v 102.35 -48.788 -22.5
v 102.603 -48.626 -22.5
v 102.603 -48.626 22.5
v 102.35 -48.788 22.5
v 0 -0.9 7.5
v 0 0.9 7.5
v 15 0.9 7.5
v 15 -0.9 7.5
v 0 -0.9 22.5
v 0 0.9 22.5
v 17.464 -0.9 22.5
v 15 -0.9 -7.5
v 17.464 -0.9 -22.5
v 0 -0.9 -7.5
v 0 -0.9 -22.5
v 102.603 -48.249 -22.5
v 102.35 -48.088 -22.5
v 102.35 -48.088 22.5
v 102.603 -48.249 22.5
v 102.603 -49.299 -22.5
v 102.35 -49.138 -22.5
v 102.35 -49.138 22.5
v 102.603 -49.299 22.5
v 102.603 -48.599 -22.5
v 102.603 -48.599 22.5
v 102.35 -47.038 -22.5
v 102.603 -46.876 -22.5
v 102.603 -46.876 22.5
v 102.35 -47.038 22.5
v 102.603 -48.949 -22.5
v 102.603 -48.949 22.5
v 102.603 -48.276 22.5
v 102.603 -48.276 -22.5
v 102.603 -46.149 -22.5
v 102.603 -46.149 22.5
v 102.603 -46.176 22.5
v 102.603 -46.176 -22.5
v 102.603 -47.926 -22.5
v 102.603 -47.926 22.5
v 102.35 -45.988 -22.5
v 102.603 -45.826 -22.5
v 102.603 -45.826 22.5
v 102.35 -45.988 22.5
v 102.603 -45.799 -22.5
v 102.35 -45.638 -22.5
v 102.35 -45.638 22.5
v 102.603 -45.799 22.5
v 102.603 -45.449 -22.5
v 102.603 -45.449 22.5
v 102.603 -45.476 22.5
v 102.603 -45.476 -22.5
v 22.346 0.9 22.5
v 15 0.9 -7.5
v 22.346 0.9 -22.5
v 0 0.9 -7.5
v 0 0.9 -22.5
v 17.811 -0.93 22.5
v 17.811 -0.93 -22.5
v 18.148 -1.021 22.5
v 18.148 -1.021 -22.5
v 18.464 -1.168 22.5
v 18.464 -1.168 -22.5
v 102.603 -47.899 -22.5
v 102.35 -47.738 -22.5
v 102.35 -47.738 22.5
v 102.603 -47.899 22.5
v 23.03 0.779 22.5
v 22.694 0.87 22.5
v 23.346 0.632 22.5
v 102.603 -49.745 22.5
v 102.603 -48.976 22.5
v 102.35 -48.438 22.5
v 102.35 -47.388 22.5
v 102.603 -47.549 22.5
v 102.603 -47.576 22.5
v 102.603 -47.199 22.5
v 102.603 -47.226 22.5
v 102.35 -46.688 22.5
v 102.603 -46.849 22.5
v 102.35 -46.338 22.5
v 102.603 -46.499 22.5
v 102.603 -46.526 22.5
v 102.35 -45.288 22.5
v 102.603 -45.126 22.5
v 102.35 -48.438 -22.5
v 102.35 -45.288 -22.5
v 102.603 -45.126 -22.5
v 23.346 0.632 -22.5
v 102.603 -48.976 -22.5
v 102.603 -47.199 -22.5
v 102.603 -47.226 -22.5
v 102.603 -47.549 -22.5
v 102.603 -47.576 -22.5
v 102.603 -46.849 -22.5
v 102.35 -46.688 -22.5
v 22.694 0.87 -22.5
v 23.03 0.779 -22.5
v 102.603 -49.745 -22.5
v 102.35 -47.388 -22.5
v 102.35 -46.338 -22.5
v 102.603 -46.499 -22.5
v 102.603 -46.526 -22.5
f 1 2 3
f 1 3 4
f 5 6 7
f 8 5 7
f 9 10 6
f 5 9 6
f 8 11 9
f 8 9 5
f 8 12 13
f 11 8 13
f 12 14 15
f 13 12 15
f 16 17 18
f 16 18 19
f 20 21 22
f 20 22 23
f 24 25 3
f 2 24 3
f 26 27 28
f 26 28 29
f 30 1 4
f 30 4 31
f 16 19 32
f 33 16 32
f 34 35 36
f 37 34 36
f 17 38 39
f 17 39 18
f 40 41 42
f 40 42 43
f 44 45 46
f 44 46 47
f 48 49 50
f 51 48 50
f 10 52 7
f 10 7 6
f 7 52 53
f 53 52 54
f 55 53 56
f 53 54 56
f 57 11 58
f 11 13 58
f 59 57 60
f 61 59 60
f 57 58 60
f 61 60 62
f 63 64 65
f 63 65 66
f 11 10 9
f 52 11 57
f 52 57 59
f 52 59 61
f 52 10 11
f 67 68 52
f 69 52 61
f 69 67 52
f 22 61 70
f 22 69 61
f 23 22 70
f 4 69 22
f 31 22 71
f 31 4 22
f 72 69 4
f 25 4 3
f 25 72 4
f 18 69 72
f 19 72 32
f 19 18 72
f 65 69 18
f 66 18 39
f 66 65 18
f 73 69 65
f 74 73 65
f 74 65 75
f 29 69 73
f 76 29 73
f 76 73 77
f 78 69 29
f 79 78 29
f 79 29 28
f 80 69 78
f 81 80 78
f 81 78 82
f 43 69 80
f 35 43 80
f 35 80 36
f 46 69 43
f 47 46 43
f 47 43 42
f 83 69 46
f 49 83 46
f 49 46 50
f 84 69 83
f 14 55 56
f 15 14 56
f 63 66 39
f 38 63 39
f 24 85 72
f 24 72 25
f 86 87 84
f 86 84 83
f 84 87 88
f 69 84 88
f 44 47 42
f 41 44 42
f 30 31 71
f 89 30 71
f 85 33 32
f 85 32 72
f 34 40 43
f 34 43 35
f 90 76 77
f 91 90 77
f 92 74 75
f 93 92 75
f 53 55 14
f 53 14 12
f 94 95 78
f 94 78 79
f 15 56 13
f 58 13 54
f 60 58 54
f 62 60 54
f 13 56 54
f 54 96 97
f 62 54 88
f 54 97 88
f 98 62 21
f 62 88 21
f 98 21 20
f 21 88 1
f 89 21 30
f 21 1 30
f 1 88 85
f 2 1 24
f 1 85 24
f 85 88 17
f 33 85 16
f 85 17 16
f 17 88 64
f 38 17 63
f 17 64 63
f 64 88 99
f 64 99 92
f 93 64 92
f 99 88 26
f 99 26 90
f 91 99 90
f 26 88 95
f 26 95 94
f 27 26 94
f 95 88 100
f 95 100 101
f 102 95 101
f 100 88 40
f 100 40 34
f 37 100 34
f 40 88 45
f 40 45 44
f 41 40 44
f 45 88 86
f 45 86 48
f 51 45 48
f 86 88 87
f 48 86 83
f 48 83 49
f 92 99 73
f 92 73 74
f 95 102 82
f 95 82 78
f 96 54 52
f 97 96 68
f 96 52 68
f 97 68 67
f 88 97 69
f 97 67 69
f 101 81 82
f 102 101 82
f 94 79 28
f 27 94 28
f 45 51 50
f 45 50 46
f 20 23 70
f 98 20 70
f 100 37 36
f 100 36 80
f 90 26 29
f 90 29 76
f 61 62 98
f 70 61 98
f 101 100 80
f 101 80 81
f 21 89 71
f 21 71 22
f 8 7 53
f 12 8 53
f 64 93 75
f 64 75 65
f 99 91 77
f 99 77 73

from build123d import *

# Parameters (mm, degrees)
SKETCH_1_W          = 45
SKETCH_1_H          = 1.8
EXTRUDE_1_DEPTH     = 18
SKETCH_2_W          = 15
SKETCH_2_H          = 15
CUT_EXTRUDE_1_DEPTH = 15
EXTRUDE_2_DEPTH     = 45
CUT_EXTRUDE_2_DEPTH = 45
CUT_EXTRUDE_3_DEPTH = 45
FILLET_1_R          = 2
FILLET_2_R          = 2


with BuildPart() as part:
    # 草图1 → 凸台-拉伸1 (new body)
    with BuildSketch(Plane(origin=(0, 0, 0), x_dir=(0, 0, -1), z_dir=(1, 0, 0))):
        Rectangle(SKETCH_1_W, SKETCH_1_H)
    extrude(amount=EXTRUDE_1_DEPTH)

    # 草图2 → 切除-拉伸1 (cut)
    with BuildSketch(Plane(origin=(0, 0.9, 0), x_dir=(1, 0, 0), z_dir=(0, 1, 0))):
        with Locations((7.5, 0)):
            Rectangle(SKETCH_2_W, SKETCH_2_H)
    extrude(amount=-CUT_EXTRUDE_1_DEPTH, mode=Mode.SUBTRACT)

    # 草图4 → 凸台-拉伸2 (add)
    with BuildSketch(Plane(origin=(0, 0, -22.5), x_dir=(-1, 0, 0), z_dir=(0, 0, -1))):
        Polygon((-18, -0.9), (-102.602540378, -49.745299462), (-104.602540378, -46.281197846), (-22.882308546, 0.9), (-18, 0.9), align=None)
    extrude(amount=-EXTRUDE_2_DEPTH)

    # 草图5 → 切除-拉伸2 (cut)
    with BuildSketch(Plane.XY.offset(22.5)):
        Polygon((102.602540378, -45.126497308), (102.602540378, -49.745299462), (104.602540378, -46.281197846), align=None)
    extrude(amount=-CUT_EXTRUDE_2_DEPTH, mode=Mode.SUBTRACT)

    # 草图6 → 切除-拉伸3 (cut)
    with BuildSketch(Plane.XY.offset(22.5)):
        Polygon((102.602540378, -45.126497308), (102.349506488, -45.287661356), (102.602540378, -45.448825404), align=None)
        Polygon((102.602540378, -45.476497308), (102.349506488, -45.637661356), (102.602540378, -45.798825404), align=None)
        Polygon((102.602540378, -45.826497308), (102.349506488, -45.987661356), (102.602540378, -46.148825404), align=None)
        Polygon((102.602540378, -46.176497308), (102.349506488, -46.337661356), (102.602540378, -46.498825404), align=None)
        Polygon((102.602540378, -46.526497308), (102.349506488, -46.687661356), (102.602540378, -46.848825404), align=None)
        Polygon((102.602540378, -46.876497308), (102.349506488, -47.037661356), (102.602540378, -47.198825404), align=None)
        Polygon((102.602540378, -47.226497308), (102.349506488, -47.387661356), (102.602540378, -47.548825404), align=None)
        Polygon((102.602540378, -47.576497308), (102.349506488, -47.737661356), (102.602540378, -47.898825404), align=None)
        Polygon((102.602540378, -47.926497308), (102.349506488, -48.087661356), (102.602540378, -48.248825404), align=None)
        Polygon((102.602540378, -48.276497308), (102.349506488, -48.437661356), (102.602540378, -48.598825404), align=None)
        Polygon((102.602540378, -48.626497308), (102.349506488, -48.787661356), (102.602540378, -48.948825404), align=None)
        Polygon((102.602540378, -48.976497308), (102.349506488, -49.137661356), (102.602540378, -49.298825404), align=None)
    extrude(amount=-CUT_EXTRUDE_3_DEPTH, mode=Mode.SUBTRACT)

    # 圆角1
    fillet_1_edges = [part.edges().sort_by_distance(p)[0] for p in [
        (22.882308546, 0.9, 0),
    ]]
    fillet(fillet_1_edges, radius=FILLET_1_R)

    # 圆角2
    fillet_2_edges = [part.edges().sort_by_distance(p)[0] for p in [
        (18, -0.9, 0),
    ]]
    fillet(fillet_2_edges, radius=FILLET_2_R)


solid = part.part
